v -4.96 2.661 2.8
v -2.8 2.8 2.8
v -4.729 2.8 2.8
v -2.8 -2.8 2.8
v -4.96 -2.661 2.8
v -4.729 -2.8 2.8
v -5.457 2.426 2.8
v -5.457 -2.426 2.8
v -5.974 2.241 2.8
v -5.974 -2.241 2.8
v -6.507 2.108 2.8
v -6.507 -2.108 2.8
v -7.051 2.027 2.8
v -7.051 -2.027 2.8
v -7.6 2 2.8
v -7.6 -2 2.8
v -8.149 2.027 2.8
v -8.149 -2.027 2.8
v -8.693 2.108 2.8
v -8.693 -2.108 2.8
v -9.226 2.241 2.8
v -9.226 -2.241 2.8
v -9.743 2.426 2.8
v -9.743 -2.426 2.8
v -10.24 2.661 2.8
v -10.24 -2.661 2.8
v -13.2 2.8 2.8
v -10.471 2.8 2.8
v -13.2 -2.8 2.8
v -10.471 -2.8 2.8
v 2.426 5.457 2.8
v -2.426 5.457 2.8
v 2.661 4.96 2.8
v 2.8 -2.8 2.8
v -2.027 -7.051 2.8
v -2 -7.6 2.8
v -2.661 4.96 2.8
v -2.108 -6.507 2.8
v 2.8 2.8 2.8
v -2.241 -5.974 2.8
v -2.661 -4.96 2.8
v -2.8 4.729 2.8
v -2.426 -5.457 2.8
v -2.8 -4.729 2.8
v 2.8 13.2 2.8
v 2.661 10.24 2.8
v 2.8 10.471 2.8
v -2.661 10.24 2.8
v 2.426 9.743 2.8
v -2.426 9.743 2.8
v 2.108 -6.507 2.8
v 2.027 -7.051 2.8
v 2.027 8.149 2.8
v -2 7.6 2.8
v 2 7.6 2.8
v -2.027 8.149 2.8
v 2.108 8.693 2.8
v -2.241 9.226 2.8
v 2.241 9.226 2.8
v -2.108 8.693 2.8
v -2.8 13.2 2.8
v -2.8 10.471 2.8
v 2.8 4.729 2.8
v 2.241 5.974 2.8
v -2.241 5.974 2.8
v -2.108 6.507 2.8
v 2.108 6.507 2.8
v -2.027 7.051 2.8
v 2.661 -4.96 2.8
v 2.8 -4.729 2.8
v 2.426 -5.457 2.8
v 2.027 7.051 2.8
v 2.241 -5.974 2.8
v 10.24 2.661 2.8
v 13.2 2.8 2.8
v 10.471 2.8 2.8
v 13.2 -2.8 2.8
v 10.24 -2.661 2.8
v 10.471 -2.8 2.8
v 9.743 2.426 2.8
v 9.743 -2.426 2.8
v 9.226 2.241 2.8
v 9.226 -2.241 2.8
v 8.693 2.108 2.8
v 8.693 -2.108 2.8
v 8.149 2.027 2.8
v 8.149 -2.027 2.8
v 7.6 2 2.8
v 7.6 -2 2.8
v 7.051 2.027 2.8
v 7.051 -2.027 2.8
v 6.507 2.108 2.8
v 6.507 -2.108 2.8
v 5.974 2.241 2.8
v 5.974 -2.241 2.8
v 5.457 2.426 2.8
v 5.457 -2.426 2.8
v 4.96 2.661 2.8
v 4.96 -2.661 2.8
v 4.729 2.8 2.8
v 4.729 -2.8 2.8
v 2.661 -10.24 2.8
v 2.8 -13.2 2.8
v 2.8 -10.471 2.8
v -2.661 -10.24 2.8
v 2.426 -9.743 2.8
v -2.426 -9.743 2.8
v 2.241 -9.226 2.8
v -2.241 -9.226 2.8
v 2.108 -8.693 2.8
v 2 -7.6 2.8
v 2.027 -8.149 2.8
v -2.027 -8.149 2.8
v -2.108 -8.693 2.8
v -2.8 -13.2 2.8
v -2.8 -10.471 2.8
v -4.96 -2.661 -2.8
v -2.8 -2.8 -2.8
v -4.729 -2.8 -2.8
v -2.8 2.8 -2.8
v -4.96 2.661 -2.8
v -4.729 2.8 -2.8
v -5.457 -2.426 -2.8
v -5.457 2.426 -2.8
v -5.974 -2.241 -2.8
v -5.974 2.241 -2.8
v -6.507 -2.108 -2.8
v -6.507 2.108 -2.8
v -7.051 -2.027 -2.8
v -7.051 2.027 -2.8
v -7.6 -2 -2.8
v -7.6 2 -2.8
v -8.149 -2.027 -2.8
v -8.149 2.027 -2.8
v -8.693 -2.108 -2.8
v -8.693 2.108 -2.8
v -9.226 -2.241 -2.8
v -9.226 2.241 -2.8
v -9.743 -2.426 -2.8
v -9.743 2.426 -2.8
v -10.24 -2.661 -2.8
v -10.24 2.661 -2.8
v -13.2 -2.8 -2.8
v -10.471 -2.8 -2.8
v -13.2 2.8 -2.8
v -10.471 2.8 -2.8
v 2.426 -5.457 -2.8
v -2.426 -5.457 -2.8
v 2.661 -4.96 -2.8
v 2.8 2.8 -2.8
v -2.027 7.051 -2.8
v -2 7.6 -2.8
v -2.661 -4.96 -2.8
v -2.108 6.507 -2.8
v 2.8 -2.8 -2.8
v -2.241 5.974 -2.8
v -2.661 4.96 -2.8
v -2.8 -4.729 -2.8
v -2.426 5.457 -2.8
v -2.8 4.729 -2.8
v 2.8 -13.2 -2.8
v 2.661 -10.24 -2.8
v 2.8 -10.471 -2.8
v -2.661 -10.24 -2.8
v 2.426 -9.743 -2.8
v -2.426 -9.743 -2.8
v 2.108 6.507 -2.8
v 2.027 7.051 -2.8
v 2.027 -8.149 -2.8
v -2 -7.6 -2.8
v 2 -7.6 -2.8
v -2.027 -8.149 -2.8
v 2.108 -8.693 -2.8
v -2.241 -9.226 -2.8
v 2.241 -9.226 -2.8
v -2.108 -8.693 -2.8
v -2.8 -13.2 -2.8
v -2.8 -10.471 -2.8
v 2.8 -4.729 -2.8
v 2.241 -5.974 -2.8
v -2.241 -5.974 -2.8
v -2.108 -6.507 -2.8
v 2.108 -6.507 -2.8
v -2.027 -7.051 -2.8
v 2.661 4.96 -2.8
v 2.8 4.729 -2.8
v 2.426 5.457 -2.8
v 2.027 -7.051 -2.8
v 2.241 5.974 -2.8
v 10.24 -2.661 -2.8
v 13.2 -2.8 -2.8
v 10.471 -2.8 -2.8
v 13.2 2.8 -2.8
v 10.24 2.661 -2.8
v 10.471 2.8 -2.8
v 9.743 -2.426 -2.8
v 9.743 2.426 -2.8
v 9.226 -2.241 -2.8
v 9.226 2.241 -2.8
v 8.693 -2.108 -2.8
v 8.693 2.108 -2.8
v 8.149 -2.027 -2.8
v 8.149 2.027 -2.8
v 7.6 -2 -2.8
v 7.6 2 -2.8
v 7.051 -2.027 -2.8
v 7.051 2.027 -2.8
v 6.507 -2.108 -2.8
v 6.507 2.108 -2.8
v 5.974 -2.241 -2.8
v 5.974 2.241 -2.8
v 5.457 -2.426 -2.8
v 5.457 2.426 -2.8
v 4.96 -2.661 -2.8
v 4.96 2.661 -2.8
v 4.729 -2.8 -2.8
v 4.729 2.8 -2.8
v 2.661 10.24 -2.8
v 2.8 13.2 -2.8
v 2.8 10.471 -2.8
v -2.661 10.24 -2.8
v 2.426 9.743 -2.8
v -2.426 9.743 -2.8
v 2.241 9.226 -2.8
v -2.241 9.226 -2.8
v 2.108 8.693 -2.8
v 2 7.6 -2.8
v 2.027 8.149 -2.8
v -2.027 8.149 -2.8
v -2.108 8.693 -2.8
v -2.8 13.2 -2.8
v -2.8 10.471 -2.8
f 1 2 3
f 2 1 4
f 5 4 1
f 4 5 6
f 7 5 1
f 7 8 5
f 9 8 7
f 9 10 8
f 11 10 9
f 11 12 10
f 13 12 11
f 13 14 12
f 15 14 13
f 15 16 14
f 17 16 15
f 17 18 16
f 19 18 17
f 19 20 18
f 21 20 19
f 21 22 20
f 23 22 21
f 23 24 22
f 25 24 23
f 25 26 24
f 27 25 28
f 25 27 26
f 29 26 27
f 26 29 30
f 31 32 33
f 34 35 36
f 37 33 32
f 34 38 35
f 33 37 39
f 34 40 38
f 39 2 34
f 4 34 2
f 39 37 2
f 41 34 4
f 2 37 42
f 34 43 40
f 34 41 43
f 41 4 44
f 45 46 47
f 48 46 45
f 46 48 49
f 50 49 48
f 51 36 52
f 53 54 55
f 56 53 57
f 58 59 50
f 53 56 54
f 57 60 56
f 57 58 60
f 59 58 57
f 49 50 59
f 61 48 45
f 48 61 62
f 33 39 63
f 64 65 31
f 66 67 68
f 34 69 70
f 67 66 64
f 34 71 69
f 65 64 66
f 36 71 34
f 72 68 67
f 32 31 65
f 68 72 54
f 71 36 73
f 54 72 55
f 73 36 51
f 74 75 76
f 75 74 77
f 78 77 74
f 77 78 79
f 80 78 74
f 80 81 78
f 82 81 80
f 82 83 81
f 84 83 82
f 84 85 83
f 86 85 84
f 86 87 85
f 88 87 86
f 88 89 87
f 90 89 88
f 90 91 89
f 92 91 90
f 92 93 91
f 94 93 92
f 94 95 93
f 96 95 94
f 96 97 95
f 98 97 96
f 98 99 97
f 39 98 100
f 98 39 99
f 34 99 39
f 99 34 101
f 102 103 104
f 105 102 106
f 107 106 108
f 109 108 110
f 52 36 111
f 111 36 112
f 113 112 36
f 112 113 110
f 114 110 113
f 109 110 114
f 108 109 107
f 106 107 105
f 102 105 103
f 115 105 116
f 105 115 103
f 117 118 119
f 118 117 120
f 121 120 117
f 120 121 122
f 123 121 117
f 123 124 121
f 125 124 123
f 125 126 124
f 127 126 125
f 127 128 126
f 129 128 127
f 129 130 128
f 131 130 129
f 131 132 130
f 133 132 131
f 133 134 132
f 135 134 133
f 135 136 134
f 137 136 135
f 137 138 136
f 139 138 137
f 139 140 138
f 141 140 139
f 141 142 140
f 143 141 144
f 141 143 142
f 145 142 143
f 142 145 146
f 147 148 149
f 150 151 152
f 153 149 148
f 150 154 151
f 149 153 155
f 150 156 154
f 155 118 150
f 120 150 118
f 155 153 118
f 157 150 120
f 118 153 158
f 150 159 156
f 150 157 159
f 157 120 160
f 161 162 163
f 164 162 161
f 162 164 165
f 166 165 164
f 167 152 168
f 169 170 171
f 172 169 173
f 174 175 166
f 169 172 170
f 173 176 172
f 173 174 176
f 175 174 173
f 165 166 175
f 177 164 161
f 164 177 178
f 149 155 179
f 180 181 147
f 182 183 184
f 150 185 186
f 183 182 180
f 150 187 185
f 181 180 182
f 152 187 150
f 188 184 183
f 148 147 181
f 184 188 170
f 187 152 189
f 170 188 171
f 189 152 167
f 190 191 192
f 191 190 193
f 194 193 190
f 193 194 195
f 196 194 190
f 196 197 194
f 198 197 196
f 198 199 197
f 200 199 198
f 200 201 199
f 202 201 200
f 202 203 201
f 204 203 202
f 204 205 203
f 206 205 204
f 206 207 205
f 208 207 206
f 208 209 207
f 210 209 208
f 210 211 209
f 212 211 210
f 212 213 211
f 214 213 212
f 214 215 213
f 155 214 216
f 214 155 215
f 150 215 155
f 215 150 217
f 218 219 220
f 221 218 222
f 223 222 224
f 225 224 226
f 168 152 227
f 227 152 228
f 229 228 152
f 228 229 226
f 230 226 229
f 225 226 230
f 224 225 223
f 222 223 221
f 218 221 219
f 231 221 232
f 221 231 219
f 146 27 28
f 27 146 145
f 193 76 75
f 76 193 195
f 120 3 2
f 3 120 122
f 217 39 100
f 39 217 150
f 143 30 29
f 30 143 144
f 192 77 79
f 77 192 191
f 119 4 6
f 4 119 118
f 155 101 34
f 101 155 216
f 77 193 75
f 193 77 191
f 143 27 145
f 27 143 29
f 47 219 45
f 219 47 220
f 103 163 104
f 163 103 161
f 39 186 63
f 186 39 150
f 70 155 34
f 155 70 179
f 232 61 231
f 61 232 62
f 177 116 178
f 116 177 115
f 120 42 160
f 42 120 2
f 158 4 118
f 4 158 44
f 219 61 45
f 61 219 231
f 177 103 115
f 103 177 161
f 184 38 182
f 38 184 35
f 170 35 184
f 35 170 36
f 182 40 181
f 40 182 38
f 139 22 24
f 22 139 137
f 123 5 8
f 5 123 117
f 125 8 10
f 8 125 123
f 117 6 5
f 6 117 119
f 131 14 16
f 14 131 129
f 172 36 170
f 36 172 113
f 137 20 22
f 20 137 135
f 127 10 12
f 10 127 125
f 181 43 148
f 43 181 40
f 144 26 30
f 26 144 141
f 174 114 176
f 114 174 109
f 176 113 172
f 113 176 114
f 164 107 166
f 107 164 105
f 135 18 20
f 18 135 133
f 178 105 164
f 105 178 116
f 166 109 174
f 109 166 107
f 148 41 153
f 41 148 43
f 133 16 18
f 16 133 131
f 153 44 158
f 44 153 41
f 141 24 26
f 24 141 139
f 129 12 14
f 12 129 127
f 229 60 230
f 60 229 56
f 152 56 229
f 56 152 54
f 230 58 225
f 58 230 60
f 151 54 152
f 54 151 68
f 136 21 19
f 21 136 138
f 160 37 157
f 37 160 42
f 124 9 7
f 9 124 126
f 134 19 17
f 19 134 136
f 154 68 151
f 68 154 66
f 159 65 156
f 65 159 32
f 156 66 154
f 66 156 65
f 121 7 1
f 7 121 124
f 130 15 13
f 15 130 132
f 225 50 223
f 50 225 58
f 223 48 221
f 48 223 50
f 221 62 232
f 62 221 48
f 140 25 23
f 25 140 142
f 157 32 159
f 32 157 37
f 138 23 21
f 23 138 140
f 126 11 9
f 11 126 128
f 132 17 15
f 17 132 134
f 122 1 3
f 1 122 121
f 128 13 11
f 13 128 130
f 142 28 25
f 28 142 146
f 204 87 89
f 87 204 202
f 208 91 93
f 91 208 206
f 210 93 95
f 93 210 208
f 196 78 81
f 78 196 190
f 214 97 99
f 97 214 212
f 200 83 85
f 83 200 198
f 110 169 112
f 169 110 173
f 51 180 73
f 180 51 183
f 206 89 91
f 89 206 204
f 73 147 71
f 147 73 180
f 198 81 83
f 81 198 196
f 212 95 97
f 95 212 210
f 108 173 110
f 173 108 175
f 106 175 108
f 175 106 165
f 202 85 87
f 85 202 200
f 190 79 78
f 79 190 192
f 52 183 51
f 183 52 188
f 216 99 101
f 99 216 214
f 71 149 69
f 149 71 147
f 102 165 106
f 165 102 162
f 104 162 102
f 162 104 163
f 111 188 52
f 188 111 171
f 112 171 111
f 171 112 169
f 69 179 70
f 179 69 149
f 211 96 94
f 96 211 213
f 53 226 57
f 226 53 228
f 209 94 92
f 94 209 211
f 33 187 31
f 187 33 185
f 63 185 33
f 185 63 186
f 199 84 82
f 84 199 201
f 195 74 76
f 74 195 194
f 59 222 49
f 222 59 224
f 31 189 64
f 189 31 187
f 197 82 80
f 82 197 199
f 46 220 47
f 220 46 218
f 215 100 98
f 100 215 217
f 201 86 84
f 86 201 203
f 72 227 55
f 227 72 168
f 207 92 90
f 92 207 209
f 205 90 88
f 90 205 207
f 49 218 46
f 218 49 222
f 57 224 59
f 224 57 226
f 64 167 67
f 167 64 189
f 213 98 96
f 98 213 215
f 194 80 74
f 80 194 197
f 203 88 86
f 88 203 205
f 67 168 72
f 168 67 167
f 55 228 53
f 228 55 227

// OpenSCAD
module rounded_plus_sign() {
    difference() {
        // Create the main cross shape
        union() {
            // Central square
            translate([-5.6/2, -5.6/2, 0])
                cube([5.6, 5.6, 5.6]);
            // Horizontal arm
            translate([-26.4/2, -5.6/2, 0])
                cube([26.4, 5.6, 5.6]);
            // Vertical arm
            translate([-5.6/2, -26.4/2, 0])
                cube([5.6, 26.4, 5.6]);
        }
        // Subtract corners to round them
        for (x = [-1, 1])
            for (y = [-1, 1])
                translate([x * (26.4/2 - 5.6), y * (26.4/2 - 5.6), 0])
                    cylinder(r=5.6, h=5.6, $fn=64);
    }
}

translate([0, 0, -5.6/2])
    rounded_plus_sign();
